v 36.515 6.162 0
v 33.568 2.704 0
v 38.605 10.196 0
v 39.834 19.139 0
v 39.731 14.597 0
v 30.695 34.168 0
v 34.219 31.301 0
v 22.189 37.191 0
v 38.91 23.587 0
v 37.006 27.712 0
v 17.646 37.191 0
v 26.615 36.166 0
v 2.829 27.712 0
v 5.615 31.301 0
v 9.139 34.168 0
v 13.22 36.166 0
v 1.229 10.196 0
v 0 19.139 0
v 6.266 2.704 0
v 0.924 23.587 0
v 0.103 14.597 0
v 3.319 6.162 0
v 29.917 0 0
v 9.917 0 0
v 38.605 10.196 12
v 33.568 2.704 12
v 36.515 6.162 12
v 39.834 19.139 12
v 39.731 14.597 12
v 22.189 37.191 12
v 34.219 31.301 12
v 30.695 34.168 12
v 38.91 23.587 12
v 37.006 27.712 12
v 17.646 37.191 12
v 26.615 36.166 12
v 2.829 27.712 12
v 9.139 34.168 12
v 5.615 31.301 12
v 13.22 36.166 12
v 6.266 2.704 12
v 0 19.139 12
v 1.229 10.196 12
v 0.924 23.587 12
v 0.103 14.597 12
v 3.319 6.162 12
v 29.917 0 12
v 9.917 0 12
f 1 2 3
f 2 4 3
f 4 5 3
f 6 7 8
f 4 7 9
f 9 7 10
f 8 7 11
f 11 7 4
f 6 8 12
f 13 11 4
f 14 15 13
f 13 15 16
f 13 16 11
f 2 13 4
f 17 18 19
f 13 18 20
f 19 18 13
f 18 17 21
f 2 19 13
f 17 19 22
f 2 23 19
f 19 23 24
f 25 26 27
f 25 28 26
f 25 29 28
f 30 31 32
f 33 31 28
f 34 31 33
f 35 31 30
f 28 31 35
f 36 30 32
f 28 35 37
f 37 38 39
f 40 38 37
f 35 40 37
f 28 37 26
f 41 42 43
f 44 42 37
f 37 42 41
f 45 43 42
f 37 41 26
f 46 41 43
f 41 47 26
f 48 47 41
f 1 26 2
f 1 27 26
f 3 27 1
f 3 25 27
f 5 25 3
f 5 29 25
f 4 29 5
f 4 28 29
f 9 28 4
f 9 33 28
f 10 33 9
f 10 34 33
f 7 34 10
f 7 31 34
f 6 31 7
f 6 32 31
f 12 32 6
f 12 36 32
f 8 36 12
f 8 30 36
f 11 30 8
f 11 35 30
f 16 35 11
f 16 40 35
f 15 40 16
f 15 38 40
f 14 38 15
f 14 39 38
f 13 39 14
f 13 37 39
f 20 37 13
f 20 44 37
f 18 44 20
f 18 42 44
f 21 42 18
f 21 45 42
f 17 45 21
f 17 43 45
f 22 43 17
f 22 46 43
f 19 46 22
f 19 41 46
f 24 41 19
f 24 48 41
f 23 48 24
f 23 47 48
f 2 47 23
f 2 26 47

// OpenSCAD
$fn = 32;

// ----------------------------------------------------------------------
// Flat adaptor: single_d, 12 mm thick
// ----------------------------------------------------------------------

// --- parameters (mm) ---
profile_height = 12;      // extrusion height
profile_points = 24;      // points of the closed outline

profile = [[29.917, 0], [33.568, 2.704], [36.515, 6.162], [38.605, 10.196], [39.731, 14.597], [39.834, 19.139], [38.91, 23.587], [37.006, 27.712], [34.219, 31.301], [30.695, 34.168], [26.615, 36.166], [22.189, 37.191], [17.646, 37.191], [13.22, 36.166], [9.139, 34.168], [5.615, 31.301], [2.829, 27.712], [0.924, 23.587], [0, 19.139], [0.103, 14.597], [1.229, 10.196], [3.319, 6.162], [6.266, 2.704], [9.917, 0]];  // single closed polygon, 24 points, counter clockwise

// --- the one profile operation ---
linear_extrude(height = profile_height) polygon(points = profile);
